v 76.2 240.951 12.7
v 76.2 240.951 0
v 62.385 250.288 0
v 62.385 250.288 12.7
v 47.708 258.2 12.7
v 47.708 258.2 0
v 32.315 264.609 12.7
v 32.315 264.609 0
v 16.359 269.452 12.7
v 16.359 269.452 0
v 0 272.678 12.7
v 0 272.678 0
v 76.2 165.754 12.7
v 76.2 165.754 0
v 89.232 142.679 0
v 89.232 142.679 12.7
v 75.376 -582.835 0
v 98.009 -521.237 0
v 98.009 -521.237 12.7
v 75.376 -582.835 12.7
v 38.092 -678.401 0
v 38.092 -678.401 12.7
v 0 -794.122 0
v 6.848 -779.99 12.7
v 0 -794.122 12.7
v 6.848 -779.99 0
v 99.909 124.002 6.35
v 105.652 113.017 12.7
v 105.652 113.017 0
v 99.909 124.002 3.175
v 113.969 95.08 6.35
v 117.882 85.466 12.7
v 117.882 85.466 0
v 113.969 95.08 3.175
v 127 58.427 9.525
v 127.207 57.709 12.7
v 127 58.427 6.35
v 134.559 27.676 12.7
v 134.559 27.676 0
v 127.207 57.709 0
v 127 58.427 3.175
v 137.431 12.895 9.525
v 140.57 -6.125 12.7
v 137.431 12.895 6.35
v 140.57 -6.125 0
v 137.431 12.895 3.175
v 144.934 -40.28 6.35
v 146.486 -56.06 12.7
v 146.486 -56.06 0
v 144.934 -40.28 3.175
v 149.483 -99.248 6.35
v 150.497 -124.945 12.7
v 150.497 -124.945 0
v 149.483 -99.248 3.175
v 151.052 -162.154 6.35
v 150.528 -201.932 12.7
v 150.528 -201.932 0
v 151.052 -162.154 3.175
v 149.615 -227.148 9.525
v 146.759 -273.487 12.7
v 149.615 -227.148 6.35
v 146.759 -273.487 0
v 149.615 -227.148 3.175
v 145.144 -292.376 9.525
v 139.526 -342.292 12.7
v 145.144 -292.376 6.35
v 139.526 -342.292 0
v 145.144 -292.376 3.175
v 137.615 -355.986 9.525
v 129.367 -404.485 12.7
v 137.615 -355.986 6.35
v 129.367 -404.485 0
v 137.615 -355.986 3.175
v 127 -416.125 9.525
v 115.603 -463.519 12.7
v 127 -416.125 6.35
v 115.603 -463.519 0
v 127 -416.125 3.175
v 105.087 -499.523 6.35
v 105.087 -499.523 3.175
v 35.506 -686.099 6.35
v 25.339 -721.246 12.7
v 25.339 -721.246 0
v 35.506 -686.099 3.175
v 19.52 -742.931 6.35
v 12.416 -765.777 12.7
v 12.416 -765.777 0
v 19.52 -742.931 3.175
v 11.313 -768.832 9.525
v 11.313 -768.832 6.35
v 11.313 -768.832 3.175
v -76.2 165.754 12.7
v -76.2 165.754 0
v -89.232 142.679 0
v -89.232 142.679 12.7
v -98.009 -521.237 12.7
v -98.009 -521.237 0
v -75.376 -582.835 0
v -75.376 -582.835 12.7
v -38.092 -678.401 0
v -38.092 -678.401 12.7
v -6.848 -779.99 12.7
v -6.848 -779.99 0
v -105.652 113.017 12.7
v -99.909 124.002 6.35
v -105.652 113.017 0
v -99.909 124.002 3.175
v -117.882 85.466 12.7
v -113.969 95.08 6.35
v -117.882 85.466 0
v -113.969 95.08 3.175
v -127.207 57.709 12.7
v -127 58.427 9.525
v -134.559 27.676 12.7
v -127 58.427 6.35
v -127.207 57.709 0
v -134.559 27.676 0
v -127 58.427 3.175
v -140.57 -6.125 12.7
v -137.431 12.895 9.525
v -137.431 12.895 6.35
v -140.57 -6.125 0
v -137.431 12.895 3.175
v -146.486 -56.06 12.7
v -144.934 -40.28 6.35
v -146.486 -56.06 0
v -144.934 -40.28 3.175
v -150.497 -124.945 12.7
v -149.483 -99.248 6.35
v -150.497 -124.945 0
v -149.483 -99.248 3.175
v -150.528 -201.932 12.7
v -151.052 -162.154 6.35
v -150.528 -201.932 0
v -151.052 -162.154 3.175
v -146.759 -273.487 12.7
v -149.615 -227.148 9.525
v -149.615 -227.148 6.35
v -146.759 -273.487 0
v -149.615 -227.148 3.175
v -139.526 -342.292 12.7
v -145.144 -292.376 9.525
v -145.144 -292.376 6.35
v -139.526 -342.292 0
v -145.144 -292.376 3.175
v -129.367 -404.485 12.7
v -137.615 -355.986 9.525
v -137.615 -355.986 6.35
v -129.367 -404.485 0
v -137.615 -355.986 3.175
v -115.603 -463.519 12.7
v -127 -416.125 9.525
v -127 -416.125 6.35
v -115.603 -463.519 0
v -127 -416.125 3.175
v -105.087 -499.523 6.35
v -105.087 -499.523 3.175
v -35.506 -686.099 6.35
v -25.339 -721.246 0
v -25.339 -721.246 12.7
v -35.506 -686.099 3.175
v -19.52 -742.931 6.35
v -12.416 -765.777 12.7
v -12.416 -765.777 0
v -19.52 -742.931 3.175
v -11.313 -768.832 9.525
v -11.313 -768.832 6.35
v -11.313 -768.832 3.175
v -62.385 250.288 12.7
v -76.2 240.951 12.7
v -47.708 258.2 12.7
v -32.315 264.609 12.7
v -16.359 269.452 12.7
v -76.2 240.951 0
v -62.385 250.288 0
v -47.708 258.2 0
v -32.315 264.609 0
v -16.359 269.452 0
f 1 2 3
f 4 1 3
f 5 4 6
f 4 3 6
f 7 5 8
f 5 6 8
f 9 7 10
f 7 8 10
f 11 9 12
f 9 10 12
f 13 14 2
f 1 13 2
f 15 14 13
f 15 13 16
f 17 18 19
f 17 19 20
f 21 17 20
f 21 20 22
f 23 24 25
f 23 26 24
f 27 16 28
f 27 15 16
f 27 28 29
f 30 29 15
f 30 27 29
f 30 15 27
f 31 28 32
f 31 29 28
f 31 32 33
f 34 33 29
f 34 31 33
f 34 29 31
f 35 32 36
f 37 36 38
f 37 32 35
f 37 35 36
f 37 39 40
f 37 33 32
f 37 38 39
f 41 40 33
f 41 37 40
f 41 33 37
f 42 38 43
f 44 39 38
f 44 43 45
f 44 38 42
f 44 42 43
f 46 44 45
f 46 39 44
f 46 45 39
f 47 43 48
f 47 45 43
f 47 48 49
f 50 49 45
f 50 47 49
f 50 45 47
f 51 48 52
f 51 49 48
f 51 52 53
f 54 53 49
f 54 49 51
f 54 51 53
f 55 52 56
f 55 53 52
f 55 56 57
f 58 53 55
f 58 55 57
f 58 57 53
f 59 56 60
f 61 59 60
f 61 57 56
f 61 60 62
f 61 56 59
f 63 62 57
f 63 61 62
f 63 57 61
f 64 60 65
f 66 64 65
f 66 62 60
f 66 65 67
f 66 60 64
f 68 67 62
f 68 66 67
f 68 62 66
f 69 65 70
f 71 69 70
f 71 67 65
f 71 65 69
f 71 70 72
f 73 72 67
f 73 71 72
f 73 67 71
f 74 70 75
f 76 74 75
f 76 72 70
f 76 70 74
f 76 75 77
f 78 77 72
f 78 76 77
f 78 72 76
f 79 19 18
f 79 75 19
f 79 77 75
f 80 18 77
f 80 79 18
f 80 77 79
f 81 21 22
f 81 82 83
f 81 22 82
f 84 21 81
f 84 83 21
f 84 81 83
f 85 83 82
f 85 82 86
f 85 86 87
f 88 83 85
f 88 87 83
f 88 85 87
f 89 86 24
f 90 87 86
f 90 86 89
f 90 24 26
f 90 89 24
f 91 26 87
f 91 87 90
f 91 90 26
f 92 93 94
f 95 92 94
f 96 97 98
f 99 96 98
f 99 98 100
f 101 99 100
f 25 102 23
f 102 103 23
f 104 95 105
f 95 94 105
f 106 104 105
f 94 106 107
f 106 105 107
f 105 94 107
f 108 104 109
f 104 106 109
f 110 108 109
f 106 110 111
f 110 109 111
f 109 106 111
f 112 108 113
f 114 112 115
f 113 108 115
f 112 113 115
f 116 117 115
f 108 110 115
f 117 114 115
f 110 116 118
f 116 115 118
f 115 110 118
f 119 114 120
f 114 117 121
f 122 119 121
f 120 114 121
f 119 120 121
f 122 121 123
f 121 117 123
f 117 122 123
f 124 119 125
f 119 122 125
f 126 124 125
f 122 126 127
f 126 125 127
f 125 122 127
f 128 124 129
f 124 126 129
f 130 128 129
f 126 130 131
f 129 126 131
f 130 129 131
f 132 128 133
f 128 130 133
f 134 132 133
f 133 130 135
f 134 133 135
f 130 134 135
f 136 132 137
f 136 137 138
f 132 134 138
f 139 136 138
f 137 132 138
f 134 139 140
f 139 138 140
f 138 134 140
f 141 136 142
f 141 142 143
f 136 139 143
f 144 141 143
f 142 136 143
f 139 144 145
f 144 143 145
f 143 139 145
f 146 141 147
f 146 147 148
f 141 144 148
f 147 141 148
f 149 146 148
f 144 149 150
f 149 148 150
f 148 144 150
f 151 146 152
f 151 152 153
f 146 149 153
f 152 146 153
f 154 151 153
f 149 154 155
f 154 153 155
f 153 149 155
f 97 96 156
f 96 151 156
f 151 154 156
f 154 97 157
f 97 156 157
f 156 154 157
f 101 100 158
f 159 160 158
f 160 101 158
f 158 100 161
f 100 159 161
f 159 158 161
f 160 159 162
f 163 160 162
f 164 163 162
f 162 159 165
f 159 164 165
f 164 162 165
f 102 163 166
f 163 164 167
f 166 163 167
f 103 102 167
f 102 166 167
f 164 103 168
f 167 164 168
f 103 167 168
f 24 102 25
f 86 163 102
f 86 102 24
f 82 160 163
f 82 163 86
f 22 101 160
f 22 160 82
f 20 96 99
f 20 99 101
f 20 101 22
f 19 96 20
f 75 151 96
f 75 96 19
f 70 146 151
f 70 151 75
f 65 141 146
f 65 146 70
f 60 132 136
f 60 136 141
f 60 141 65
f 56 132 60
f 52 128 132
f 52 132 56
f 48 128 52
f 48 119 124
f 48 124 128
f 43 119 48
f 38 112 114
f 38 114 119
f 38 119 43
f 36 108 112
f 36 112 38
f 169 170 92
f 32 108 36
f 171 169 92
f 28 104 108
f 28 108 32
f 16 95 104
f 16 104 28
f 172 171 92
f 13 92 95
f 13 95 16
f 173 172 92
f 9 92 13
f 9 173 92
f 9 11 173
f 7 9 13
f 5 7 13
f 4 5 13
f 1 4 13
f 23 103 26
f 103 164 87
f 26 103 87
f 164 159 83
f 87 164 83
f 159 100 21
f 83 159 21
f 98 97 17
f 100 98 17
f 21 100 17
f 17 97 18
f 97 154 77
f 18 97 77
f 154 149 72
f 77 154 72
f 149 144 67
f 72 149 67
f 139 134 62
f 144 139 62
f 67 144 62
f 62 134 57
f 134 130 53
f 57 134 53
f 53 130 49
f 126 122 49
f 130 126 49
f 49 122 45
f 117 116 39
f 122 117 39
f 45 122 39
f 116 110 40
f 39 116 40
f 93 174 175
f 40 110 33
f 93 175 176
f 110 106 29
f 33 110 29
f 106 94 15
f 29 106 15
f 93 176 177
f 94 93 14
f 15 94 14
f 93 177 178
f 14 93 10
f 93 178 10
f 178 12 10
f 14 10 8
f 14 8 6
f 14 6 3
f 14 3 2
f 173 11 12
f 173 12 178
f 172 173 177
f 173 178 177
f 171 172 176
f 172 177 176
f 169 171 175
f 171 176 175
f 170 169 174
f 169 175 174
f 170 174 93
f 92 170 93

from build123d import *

# Parameters (mm, degrees)
F1_DEPTH = 12.7


with BuildPart() as f1:
    # F0 (on Top) → F1 (new body)
    with BuildSketch(Plane.XY):
        with BuildLine():
            Line((-76.2, 240.9512801597), (-76.2, 165.7536232223))
            add(Edge.make_bspline(
                [(-76.2, 165.7536232223), (-87.5461395236, 142.7060091543), (-158.322032287, 54.332806781), (-160.0229913718, -425.4641270136), (-28.2991169966, -674.7733581716), (-18.1428712038, -760.455191216), (0, -794.1216259309)],
                knots=[0, 0, 0, 0, 0.1809270507, 0.5426219142, 0.8229493678, 1, 1, 1, 1], degree=3))
            add(Edge.make_bspline(
                [(76.2, 165.7536232223), (87.5461395236, 142.7060091543), (158.322032287, 54.332806781), (160.0229913718, -425.4641270136), (28.2991169966, -674.7733581716), (18.1428712038, -760.455191216), (0, -794.1216259309)],
                knots=[0, 0, 0, 0, 0.1809270507, 0.5426219142, 0.8229493678, 1, 1, 1, 1], degree=3))
            Line((76.2, 165.7536232223), (76.2, 240.9512801597))
            ThreePointArc((76.2, 240.9512801597), (40.0911399896, 261.5970132056), (0, 272.6783740691))
            ThreePointArc((0, 272.6783740691), (-40.0911399896, 261.5970132056), (-76.2, 240.9512801597))
        make_face()
    extrude(amount=F1_DEPTH)


solid = f1.part
